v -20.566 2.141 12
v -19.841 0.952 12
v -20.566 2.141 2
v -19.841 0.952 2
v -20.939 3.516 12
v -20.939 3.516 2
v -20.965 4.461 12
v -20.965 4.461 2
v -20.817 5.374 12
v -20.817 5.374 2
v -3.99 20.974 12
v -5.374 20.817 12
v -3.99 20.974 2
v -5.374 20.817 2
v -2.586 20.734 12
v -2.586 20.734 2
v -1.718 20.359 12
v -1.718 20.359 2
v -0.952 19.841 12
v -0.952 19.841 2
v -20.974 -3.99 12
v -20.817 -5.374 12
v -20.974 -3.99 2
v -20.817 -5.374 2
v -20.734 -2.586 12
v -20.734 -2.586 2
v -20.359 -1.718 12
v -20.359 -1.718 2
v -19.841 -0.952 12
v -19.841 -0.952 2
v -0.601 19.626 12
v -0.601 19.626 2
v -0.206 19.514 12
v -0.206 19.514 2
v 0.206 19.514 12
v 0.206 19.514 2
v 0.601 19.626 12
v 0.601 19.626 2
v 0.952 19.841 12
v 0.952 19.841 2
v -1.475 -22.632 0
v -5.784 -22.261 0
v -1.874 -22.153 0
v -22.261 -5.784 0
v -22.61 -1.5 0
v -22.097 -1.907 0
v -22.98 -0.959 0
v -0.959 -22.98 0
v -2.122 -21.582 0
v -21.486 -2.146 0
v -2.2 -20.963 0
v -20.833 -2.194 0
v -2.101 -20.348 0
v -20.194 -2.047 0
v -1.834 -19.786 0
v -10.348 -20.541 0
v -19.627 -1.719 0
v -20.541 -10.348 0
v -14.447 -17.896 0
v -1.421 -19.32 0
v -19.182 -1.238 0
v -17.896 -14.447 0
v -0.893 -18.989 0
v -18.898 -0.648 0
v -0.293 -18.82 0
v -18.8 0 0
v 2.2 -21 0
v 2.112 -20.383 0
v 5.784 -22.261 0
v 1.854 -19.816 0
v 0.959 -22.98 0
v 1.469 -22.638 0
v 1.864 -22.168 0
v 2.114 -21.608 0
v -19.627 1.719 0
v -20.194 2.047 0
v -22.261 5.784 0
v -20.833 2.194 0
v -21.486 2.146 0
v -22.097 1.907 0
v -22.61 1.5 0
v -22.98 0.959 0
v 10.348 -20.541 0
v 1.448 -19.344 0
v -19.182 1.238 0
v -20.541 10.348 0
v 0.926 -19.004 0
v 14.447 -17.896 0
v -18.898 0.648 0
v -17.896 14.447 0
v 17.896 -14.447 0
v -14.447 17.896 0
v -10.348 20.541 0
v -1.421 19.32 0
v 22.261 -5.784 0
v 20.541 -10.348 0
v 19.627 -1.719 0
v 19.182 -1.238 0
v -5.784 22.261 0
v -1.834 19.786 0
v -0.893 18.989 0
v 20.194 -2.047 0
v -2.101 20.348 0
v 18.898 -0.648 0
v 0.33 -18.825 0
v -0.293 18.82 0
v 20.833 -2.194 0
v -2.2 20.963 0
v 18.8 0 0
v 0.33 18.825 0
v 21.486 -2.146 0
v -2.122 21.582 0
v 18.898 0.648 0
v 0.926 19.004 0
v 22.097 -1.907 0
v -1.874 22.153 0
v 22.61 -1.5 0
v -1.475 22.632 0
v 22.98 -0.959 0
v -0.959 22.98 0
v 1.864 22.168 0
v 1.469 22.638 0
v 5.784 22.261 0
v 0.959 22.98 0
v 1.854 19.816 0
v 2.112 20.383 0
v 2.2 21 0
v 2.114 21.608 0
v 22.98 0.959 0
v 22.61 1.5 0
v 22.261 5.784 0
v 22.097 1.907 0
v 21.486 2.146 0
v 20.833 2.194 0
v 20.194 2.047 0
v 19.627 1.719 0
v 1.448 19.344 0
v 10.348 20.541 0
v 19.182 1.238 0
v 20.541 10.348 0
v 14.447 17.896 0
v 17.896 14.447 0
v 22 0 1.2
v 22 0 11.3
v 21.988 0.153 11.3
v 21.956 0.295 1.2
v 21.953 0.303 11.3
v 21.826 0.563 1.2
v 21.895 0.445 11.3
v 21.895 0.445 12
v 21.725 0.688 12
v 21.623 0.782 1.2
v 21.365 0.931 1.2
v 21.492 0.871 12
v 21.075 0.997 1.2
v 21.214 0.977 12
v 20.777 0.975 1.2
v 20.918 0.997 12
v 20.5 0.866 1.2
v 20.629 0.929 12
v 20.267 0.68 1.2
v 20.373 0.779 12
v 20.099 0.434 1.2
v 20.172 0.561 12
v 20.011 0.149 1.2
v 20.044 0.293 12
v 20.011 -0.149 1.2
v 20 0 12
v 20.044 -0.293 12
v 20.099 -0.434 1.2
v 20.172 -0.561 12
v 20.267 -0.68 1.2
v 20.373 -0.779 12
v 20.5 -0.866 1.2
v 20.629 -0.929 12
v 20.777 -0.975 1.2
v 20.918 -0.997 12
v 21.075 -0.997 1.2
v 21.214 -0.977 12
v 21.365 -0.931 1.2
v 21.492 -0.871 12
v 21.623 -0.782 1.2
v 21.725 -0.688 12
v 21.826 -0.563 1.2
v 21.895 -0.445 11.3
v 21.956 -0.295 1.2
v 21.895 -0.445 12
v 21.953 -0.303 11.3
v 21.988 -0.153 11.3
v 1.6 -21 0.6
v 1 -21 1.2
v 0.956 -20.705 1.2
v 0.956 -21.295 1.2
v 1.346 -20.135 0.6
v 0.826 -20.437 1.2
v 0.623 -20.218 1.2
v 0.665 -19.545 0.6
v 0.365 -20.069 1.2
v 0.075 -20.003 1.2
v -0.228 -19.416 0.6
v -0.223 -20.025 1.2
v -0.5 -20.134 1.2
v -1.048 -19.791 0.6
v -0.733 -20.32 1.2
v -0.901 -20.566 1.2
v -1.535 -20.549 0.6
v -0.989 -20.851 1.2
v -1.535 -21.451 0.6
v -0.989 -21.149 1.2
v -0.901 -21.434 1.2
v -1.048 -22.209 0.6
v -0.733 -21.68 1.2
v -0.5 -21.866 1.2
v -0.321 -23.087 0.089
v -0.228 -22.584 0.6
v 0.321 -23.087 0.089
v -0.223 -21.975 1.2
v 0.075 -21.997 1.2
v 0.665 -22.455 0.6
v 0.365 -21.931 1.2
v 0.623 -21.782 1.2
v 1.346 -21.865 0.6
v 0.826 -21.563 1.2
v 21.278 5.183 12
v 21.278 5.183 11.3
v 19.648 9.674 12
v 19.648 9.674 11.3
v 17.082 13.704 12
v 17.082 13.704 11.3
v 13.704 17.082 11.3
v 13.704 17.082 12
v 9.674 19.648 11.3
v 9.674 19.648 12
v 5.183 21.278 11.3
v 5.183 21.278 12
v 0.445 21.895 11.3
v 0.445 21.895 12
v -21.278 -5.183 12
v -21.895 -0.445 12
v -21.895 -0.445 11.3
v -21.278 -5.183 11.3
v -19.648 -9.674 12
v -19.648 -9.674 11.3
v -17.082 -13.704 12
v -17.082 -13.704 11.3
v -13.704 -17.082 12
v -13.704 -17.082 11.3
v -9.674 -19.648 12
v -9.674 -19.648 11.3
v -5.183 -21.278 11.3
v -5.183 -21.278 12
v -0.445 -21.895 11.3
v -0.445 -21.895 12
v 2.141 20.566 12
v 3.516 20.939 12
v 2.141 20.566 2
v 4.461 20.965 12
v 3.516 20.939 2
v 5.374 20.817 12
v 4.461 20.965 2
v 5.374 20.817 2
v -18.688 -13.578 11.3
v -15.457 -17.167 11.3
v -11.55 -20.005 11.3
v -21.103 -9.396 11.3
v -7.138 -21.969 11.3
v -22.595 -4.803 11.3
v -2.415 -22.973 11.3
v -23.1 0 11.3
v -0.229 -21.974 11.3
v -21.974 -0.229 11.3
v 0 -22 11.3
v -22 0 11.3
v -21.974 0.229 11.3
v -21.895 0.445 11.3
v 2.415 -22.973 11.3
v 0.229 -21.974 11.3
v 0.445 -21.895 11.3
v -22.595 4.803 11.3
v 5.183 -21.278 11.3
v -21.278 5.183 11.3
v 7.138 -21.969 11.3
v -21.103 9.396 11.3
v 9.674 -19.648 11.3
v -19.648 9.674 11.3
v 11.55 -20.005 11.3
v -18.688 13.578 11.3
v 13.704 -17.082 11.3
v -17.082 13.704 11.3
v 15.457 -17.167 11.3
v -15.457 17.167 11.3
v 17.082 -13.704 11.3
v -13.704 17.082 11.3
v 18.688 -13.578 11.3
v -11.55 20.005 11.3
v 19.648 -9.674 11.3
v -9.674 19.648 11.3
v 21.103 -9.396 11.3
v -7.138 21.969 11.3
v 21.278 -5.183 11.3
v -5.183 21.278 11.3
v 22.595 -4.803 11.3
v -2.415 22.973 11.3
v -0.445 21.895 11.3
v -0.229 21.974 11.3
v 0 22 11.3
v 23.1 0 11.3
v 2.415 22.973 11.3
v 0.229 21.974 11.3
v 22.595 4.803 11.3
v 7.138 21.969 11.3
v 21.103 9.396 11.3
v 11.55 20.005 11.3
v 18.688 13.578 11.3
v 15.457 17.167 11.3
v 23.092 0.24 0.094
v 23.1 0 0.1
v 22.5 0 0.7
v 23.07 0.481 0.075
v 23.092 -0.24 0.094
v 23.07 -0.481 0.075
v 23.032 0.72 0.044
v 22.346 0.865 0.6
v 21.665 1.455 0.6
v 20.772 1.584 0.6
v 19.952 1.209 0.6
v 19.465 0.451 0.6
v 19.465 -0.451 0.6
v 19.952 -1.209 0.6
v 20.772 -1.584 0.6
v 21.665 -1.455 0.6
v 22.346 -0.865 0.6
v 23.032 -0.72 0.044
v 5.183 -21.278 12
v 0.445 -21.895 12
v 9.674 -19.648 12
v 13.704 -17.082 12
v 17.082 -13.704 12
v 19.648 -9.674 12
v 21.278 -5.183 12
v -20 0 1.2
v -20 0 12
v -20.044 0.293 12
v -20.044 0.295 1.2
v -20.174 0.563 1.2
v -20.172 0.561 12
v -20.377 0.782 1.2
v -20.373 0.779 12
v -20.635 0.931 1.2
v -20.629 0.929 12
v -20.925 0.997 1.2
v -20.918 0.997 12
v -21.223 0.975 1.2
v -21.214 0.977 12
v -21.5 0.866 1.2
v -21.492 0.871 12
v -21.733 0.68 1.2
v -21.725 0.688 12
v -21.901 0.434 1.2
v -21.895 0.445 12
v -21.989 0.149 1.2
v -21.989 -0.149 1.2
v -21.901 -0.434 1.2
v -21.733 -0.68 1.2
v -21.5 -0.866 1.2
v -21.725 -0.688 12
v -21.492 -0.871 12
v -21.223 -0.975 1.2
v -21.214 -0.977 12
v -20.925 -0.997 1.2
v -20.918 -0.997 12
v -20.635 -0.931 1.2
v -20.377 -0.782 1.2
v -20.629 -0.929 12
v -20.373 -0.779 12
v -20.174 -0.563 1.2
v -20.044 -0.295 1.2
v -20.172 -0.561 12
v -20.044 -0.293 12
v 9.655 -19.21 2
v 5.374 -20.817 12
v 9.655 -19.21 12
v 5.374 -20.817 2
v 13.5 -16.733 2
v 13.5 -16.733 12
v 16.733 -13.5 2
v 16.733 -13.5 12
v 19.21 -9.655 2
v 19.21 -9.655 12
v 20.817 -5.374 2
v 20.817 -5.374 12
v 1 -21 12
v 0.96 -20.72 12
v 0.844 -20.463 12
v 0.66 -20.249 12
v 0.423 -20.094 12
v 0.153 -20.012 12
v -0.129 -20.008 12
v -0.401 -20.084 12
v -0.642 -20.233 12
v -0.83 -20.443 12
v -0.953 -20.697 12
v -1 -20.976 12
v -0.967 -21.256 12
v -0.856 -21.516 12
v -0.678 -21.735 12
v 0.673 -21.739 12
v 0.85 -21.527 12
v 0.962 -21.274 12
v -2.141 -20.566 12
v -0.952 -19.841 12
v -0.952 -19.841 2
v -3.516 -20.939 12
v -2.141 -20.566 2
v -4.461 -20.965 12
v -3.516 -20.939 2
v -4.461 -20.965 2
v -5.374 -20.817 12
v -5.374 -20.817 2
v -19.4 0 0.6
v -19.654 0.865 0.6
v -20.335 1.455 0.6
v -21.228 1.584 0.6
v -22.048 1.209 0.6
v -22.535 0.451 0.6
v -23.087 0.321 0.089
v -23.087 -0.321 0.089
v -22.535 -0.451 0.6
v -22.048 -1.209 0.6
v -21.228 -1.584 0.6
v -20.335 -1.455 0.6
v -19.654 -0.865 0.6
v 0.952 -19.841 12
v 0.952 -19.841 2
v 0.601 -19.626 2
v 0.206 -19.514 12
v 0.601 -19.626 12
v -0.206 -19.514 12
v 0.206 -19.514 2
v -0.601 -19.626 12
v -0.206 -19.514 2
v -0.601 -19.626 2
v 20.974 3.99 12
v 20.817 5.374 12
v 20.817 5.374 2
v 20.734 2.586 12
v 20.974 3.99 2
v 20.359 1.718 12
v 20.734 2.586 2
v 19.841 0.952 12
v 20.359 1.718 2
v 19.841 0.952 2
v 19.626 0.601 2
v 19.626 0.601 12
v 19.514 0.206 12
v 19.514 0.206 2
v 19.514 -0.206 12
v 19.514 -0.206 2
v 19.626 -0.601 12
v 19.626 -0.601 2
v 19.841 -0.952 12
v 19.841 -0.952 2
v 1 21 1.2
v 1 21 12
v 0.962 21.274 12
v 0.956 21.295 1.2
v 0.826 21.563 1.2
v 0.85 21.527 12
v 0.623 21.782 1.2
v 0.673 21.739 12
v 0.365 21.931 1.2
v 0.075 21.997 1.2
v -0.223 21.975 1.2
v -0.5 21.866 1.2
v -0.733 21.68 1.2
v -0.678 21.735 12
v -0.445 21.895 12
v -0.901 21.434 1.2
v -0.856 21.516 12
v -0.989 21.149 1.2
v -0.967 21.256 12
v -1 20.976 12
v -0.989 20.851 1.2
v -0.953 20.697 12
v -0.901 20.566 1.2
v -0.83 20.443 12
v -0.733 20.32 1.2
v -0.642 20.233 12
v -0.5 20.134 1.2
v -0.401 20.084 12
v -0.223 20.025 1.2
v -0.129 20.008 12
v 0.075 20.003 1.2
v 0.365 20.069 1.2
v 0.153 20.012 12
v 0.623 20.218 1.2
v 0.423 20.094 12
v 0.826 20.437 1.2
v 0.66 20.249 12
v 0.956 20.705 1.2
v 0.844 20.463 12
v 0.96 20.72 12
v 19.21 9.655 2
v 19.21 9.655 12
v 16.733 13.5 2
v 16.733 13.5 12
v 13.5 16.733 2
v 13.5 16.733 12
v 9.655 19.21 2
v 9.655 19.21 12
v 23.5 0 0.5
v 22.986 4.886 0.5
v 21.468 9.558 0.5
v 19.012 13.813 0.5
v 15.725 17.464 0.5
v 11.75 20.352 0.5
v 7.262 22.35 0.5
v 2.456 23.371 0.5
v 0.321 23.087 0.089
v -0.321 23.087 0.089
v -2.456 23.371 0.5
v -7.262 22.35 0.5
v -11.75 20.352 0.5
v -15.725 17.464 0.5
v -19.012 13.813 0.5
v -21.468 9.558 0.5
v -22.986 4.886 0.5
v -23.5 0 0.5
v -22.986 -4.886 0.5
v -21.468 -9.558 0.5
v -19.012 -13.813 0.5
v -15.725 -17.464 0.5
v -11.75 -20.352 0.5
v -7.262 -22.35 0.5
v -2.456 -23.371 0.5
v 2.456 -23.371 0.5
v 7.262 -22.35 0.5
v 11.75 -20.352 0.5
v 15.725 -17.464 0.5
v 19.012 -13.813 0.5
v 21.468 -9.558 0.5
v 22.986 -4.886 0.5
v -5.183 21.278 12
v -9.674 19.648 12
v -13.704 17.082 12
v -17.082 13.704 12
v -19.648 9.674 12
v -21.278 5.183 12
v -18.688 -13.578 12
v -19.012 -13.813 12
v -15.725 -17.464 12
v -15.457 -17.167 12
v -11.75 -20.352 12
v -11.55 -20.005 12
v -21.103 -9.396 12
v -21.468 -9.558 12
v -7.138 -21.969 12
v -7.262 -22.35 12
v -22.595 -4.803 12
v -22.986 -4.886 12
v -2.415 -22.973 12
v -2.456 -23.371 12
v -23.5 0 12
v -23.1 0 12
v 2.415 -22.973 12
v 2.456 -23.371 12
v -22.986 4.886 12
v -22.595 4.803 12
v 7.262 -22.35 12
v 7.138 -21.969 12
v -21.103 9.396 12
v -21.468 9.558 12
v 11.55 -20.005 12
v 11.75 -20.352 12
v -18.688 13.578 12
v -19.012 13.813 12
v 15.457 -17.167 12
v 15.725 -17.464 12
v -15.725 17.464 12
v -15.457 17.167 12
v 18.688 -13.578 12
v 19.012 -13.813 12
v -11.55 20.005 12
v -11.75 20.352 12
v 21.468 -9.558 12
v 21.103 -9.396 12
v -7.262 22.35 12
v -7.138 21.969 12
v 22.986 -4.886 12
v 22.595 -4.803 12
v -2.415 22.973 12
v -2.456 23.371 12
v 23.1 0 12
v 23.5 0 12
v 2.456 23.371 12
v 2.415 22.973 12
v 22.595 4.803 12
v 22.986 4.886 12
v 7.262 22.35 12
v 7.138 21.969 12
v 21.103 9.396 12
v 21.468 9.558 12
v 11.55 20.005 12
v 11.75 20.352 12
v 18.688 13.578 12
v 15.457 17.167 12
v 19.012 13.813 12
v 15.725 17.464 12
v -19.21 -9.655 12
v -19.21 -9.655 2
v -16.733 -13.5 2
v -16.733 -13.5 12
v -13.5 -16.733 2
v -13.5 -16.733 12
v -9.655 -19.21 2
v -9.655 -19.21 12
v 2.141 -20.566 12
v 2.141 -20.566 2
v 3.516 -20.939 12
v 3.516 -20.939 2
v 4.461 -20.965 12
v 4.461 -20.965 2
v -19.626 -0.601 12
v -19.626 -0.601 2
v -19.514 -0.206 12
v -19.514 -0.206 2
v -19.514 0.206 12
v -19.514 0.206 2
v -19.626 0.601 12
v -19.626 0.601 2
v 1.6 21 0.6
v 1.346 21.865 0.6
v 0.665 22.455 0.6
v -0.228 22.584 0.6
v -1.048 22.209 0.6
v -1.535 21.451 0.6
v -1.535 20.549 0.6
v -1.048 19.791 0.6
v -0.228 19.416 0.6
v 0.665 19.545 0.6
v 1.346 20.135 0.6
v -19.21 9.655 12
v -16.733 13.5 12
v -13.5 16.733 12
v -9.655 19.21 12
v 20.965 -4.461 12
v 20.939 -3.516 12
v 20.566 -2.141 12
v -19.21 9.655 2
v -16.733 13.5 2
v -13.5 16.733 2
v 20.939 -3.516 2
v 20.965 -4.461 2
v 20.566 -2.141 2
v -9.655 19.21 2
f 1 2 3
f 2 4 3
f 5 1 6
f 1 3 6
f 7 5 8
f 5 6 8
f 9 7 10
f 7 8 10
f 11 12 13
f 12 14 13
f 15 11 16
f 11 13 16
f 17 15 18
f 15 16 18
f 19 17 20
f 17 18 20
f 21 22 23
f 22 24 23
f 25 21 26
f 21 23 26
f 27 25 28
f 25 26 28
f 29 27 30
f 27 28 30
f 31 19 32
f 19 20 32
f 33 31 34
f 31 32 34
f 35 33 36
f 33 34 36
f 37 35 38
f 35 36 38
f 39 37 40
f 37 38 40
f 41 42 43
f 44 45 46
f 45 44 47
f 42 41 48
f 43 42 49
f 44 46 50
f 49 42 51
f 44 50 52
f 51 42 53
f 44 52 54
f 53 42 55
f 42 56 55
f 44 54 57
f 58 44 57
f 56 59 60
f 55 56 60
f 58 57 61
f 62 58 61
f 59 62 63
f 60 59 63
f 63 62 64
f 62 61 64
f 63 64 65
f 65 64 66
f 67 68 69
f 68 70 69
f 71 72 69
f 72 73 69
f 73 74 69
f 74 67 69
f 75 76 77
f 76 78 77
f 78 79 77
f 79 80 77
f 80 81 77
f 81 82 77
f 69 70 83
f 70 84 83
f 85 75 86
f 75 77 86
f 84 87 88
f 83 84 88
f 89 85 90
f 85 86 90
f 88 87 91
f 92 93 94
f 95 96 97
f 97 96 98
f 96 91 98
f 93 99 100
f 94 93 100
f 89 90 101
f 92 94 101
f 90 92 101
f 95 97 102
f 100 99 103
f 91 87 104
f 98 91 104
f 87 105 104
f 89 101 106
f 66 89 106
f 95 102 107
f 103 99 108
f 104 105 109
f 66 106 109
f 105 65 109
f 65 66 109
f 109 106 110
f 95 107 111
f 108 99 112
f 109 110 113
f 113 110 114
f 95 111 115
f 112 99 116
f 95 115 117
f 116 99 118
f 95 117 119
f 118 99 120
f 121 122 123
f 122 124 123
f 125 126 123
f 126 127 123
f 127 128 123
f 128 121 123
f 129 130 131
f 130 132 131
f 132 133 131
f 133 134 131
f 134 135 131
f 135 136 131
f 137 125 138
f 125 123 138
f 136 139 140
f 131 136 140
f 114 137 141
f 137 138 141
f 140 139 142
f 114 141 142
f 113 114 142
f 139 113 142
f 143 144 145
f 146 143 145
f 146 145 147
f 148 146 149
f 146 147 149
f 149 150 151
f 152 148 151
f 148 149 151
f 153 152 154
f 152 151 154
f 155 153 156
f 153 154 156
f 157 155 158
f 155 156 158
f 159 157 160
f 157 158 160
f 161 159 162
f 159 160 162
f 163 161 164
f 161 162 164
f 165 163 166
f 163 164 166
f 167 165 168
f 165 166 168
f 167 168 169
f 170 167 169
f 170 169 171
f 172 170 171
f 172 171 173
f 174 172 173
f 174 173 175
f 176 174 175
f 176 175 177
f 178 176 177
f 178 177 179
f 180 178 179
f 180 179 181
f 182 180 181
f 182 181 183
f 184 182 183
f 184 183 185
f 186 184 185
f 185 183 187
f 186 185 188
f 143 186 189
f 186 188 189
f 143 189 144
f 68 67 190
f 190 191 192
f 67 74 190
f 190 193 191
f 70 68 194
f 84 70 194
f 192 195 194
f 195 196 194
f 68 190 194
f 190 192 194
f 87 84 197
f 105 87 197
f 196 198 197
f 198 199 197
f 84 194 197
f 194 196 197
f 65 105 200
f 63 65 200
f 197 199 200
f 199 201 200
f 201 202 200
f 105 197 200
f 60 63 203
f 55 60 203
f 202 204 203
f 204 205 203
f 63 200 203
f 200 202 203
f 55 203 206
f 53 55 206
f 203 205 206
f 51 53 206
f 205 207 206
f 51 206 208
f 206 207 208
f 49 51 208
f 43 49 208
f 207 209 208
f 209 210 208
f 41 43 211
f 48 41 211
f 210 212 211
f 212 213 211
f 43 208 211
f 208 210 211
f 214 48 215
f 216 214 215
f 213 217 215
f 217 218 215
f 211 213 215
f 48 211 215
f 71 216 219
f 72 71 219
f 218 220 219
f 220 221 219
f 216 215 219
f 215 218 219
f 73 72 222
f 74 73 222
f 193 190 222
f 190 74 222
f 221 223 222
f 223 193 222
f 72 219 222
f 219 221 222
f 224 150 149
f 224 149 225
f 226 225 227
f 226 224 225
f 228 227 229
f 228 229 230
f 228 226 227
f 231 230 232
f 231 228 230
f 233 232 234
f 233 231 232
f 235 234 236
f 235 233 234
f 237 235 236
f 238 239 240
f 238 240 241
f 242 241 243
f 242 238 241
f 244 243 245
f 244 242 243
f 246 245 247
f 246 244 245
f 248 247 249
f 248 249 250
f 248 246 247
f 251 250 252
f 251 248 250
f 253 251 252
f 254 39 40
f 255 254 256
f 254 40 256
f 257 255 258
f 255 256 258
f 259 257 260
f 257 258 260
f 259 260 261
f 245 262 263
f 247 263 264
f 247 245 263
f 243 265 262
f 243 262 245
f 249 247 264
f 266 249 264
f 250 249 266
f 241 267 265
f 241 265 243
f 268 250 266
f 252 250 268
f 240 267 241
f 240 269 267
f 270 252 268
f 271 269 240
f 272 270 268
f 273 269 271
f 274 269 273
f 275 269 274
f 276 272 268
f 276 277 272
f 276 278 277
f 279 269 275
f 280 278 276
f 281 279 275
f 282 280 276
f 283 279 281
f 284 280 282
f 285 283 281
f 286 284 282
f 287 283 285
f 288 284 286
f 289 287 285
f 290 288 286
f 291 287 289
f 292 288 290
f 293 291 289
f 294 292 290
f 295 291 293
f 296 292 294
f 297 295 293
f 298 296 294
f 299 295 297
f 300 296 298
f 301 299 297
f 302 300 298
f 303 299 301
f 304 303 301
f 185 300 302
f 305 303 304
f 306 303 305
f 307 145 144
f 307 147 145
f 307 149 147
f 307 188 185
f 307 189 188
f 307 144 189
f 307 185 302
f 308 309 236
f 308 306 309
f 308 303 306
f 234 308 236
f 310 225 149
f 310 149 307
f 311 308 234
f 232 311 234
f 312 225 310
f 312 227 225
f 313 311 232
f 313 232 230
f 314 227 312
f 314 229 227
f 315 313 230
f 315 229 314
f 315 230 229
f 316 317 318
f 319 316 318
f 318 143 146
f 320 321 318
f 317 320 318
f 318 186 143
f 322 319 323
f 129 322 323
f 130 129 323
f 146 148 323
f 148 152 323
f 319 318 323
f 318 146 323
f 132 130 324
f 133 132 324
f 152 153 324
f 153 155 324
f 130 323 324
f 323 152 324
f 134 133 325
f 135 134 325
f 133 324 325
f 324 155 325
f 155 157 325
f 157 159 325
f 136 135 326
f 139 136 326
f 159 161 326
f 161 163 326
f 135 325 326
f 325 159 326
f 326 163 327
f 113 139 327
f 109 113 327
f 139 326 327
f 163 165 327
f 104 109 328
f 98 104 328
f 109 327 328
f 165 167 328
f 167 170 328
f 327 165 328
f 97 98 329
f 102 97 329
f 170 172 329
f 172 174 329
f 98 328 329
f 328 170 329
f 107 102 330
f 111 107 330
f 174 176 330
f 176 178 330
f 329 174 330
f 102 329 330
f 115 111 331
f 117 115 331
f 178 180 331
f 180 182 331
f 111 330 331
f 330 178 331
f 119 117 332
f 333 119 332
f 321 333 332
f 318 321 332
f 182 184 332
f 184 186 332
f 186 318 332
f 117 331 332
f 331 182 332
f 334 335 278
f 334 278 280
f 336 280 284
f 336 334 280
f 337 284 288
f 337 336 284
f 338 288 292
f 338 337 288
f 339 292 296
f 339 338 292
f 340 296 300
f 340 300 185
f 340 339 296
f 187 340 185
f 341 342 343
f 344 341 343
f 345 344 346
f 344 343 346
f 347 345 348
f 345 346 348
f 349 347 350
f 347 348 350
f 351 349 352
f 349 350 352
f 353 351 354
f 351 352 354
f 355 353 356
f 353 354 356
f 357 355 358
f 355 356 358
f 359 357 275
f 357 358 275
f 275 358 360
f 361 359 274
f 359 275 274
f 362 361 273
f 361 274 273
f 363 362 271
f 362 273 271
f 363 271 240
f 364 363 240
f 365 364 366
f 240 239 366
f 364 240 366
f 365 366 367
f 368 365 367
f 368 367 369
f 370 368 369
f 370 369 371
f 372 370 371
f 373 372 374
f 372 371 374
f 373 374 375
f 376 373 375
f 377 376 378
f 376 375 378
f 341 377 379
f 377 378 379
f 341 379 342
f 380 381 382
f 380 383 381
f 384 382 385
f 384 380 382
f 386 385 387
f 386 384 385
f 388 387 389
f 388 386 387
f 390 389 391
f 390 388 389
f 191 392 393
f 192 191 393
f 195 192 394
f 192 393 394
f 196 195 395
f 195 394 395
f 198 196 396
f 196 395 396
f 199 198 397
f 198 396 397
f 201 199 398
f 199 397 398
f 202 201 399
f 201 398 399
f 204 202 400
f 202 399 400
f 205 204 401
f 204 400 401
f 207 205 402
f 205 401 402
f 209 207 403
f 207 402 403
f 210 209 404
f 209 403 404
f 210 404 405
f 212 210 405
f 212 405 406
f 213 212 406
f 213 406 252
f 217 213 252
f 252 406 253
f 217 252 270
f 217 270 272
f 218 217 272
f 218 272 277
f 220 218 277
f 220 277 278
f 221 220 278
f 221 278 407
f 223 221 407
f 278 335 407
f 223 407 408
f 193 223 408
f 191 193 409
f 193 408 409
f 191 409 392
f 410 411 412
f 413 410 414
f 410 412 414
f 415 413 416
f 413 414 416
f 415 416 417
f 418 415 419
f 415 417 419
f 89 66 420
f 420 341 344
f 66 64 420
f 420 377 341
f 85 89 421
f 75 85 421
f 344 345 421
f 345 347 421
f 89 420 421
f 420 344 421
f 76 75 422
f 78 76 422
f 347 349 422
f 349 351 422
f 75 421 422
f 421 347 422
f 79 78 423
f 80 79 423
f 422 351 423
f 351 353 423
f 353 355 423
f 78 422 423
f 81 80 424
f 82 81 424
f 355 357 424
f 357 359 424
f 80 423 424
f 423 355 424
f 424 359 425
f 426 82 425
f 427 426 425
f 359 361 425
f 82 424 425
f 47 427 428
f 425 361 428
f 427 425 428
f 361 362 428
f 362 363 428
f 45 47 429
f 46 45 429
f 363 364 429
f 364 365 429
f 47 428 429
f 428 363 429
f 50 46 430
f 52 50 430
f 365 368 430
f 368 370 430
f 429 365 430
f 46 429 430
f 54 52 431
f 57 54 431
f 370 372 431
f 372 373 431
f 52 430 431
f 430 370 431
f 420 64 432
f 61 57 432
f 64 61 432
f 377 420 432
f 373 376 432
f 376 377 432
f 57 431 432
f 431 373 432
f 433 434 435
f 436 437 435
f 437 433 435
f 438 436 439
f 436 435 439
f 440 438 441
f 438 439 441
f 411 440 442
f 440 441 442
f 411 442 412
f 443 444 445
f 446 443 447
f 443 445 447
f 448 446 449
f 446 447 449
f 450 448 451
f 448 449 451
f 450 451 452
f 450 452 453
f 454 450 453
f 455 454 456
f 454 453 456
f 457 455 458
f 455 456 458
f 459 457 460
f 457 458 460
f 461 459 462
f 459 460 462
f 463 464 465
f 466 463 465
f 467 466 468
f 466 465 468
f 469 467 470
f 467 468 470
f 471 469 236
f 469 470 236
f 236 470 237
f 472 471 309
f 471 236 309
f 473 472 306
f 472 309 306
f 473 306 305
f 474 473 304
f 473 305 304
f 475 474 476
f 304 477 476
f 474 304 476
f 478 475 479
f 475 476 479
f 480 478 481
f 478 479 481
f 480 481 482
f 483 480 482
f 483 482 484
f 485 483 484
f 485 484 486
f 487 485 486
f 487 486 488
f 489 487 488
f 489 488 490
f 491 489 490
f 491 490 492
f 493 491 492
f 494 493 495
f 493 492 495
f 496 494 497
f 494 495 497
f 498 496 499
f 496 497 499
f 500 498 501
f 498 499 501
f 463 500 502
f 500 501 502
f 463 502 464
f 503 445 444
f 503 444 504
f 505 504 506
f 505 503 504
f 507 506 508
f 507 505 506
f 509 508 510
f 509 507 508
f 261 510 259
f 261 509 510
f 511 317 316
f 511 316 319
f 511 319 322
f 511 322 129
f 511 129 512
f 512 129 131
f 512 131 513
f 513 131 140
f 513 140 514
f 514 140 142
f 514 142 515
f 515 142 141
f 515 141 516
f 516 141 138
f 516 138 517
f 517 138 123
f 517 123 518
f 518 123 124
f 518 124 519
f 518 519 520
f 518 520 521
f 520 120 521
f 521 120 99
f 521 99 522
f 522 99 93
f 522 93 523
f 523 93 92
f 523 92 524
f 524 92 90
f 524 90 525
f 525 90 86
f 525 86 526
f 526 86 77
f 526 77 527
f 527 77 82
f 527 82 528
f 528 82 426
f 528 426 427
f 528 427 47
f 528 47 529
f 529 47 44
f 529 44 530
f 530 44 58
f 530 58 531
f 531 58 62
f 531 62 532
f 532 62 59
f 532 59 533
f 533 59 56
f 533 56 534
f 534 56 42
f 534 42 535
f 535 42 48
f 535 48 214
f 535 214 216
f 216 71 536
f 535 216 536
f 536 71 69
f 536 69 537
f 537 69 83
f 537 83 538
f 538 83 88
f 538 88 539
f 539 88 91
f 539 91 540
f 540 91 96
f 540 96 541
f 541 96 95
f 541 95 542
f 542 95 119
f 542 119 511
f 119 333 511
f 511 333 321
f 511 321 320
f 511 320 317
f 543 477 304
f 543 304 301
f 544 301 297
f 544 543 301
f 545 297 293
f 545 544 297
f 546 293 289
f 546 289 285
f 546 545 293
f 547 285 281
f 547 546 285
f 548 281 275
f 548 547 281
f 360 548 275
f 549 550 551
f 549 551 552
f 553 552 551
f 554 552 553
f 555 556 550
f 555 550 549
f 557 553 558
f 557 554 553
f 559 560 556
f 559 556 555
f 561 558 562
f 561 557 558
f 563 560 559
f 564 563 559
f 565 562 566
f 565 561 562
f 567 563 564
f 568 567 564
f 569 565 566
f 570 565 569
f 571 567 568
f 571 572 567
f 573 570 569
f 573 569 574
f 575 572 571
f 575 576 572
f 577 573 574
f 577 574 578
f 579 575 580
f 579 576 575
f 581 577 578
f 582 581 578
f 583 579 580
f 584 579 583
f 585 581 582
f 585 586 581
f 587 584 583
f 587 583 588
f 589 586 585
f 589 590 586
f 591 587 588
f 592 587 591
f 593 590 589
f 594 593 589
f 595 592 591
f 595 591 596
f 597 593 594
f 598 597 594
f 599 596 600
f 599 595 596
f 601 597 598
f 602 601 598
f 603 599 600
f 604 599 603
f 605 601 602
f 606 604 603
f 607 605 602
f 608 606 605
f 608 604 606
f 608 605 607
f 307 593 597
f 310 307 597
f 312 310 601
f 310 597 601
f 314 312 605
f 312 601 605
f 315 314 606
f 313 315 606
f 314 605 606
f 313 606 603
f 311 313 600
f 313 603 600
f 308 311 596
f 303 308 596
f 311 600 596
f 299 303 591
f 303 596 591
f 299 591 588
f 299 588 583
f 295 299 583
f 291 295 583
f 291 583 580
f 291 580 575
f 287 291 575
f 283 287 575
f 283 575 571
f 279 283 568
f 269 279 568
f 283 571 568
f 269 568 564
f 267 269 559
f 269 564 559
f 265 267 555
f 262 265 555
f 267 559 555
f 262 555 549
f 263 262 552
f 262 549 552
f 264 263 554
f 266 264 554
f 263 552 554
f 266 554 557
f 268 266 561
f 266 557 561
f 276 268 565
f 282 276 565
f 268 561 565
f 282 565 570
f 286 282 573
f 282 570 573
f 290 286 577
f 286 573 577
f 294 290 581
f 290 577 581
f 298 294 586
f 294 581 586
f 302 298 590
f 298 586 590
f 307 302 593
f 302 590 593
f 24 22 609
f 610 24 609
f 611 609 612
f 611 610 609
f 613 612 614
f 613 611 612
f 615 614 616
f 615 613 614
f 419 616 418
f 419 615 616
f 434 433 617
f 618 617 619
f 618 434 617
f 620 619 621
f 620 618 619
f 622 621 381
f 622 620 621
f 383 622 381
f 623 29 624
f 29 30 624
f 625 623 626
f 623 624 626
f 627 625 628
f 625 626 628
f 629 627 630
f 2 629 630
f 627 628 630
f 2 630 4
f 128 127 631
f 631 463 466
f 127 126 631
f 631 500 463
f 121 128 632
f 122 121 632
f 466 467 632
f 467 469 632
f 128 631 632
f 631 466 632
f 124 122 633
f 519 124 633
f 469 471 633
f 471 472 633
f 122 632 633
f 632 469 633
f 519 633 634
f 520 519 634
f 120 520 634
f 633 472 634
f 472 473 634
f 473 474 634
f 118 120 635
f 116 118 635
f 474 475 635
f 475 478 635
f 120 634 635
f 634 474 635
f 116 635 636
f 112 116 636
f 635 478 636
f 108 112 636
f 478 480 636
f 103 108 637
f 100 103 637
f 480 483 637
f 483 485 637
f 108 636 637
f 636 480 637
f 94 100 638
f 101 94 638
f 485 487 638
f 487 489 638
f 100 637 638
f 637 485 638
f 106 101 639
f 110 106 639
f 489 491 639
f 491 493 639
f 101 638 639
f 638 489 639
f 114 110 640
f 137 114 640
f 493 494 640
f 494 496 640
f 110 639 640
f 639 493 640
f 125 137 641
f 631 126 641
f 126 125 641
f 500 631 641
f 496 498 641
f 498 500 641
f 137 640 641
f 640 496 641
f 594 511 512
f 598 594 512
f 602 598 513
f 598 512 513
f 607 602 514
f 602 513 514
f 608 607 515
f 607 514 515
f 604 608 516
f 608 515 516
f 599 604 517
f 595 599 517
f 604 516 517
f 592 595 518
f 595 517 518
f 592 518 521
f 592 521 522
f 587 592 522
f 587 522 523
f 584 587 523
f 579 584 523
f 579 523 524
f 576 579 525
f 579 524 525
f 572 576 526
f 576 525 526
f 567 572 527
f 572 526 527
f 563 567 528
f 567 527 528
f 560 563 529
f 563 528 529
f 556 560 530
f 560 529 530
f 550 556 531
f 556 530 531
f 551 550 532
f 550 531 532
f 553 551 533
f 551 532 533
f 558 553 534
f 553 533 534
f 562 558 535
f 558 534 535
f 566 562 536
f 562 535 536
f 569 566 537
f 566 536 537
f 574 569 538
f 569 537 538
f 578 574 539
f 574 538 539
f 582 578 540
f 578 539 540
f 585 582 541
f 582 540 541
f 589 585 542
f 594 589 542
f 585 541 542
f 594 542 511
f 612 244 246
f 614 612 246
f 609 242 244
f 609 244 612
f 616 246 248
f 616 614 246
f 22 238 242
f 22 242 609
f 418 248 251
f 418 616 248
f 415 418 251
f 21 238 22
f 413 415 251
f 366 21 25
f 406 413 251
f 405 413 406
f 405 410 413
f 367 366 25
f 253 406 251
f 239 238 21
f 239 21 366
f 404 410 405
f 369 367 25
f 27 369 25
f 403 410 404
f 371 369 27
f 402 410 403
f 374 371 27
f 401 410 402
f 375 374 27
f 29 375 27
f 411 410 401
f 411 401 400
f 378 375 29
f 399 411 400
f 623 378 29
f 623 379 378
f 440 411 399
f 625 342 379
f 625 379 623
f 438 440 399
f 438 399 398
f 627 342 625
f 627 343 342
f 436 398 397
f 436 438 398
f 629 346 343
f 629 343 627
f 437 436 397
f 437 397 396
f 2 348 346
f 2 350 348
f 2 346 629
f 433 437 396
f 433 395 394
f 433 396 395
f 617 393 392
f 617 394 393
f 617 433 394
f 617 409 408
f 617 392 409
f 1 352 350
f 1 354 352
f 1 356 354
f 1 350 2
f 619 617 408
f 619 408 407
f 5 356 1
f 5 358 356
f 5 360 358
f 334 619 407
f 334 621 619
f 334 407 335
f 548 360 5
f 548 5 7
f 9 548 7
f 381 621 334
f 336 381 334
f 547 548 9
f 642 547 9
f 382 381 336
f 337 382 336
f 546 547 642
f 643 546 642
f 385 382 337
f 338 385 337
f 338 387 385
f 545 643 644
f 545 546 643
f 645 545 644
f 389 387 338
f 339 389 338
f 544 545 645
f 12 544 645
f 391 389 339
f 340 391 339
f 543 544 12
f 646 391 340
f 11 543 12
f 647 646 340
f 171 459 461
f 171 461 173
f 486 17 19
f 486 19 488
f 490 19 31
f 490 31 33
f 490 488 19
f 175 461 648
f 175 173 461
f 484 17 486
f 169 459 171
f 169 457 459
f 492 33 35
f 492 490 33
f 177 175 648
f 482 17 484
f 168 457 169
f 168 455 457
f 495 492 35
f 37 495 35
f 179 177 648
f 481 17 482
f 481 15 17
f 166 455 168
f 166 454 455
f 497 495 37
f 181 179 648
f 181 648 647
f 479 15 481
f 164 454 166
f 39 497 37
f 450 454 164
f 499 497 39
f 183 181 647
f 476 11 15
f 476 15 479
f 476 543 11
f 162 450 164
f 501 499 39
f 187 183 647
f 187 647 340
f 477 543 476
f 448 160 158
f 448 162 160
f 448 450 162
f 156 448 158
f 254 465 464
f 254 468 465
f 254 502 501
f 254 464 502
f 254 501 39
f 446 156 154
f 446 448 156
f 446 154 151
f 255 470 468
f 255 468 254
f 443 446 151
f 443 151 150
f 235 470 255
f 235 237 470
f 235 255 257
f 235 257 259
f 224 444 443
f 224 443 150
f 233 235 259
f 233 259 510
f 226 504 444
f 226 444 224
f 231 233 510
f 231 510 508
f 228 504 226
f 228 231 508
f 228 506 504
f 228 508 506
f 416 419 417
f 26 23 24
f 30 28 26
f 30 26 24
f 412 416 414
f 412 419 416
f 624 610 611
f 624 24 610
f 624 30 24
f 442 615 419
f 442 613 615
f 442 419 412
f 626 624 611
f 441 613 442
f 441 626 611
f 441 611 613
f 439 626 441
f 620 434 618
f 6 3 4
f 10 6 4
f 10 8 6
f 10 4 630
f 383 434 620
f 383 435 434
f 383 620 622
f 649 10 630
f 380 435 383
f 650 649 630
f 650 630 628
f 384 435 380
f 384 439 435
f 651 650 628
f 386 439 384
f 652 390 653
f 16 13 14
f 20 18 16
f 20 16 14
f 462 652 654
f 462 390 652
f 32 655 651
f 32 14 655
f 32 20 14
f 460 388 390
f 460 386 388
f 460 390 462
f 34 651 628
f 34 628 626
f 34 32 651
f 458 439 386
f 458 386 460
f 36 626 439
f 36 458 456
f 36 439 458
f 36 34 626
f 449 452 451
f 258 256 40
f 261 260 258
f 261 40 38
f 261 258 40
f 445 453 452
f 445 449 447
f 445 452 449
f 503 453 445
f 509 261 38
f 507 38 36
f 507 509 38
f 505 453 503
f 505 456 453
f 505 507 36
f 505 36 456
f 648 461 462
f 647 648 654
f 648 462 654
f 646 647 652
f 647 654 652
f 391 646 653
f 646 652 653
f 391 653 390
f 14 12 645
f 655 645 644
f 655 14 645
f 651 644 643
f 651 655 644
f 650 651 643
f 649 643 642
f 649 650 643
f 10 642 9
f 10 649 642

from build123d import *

# Parameters (mm, degrees)
F0_R      = 23.5
F1_DEPTH  = 12
F2_T      = -2
F3_SIZE   = 0.5
F4_R      = 1.5
F5_DEPTH  = 10
F6_R      = 5
F7_R      = 1
F8_DEPTH  = 12.001
F9_R      = 23.1
F9_R_2    = 21.9
F10_DEPTH = 0.7


# Not quite as in the source:
# - a fillet or chamfer that OpenCascade refuses, or shapes differently, is made with other operations: its cross-section is extruded or revolved along the edge and cut away or added


with BuildPart() as f1:
    # F0 (on Top) → F1 (new body)
    with BuildSketch(Plane.XY):
        Circle(F0_R)
    extrude(amount=F1_DEPTH)

    # F2
    f2_openings = [f1.faces().sort_by_distance(p)[0] for p in [
        (0, 0, 12),
    ]]
    offset(amount=F2_T, openings=f2_openings)

    # F3
    f3_edges = [f1.edges().sort_by_distance(p)[0] for p in [
        (-23.5, 0, 0),
    ]]
    chamfer(f3_edges, length=F3_SIZE)

    # F4 (on face) → F5 (join, through all)
    with BuildSketch(Plane.XY.offset(2)):
        with Locations((0, -21)):
            Circle(F4_R)
        with Locations((21, 0)):
            Circle(F4_R)
        with Locations((0, 21)):
            Circle(F4_R)
        with Locations((-21, 0)):
            Circle(F4_R)
    extrude(amount=F5_DEPTH)

    # F6
    f6_edges = [f1.edges().sort_by_distance(p)[0] for p in [
        (-21.452381, 1.430158, 7),
        (-21.452381, -1.430158, 7),
        (-1.430158, 21.452381, 7),
        (1.430158, 21.452381, 7),
        (21.452381, -1.430158, 7),
        (21.452381, 1.430158, 7),
        (-1.430158, -21.452381, 7),
        (1.430158, -21.452381, 7),
    ]]
    fillet(f6_edges, radius=F6_R)

    # F7 (on face) → F8 (cut, through all)
    with BuildSketch(Plane.XY.offset(12)):
        with Locations((0, -21)):
            Circle(F7_R)
        with Locations((21, 0)):
            Circle(F7_R)
        with Locations((0, 21)):
            Circle(F7_R)
        with Locations((-21, 0)):
            Circle(F7_R)
    extrude(amount=-F8_DEPTH, mode=Mode.SUBTRACT)

    # F9 (on face) → F10 (cut)
    with BuildSketch(Plane.XY.offset(12)):
        Circle(F9_R)
        Circle(F9_R_2, mode=Mode.SUBTRACT)
    extrude(amount=-F10_DEPTH, mode=Mode.SUBTRACT)

    # F11: chamfer of 1.2 on 4 edges, made by hand

    # F11_s1 → F11_t2 (revolve, cut)
    with BuildSketch(Plane.XZ.offset(-21)):
        Polygon((2.2, 0), (1, 1.2), (1, 0), align=None)
    revolve(axis=Axis((0, 21, 0), (0, 0, 1)), mode=Mode.SUBTRACT)

    # F11_s3 → F11_t4 (revolve, cut)
    with BuildSketch(Plane.XZ):
        Polygon((23.2, 0), (22, 1.2), (22, 0), align=None)
    revolve(axis=Axis((21, 0, 0), (0, 0, 1)), mode=Mode.SUBTRACT)

    # F11_s5 → F11_t6 (revolve, cut)
    with BuildSketch(Plane.XZ.offset(21)):
        Polygon((2.2, 0), (1, 1.2), (1, 0), align=None)
    revolve(axis=Axis((0, -21, 0), (0, 0, 1)), mode=Mode.SUBTRACT)

    # F11_s7 → F11_t8 (revolve, cut)
    with BuildSketch(Plane.XZ):
        Polygon((-18.8, 0), (-20, 1.2), (-20, 0), align=None)
    revolve(axis=Axis((-21, 0, 0), (0, 0, 1)), mode=Mode.SUBTRACT)


solid = f1.part
